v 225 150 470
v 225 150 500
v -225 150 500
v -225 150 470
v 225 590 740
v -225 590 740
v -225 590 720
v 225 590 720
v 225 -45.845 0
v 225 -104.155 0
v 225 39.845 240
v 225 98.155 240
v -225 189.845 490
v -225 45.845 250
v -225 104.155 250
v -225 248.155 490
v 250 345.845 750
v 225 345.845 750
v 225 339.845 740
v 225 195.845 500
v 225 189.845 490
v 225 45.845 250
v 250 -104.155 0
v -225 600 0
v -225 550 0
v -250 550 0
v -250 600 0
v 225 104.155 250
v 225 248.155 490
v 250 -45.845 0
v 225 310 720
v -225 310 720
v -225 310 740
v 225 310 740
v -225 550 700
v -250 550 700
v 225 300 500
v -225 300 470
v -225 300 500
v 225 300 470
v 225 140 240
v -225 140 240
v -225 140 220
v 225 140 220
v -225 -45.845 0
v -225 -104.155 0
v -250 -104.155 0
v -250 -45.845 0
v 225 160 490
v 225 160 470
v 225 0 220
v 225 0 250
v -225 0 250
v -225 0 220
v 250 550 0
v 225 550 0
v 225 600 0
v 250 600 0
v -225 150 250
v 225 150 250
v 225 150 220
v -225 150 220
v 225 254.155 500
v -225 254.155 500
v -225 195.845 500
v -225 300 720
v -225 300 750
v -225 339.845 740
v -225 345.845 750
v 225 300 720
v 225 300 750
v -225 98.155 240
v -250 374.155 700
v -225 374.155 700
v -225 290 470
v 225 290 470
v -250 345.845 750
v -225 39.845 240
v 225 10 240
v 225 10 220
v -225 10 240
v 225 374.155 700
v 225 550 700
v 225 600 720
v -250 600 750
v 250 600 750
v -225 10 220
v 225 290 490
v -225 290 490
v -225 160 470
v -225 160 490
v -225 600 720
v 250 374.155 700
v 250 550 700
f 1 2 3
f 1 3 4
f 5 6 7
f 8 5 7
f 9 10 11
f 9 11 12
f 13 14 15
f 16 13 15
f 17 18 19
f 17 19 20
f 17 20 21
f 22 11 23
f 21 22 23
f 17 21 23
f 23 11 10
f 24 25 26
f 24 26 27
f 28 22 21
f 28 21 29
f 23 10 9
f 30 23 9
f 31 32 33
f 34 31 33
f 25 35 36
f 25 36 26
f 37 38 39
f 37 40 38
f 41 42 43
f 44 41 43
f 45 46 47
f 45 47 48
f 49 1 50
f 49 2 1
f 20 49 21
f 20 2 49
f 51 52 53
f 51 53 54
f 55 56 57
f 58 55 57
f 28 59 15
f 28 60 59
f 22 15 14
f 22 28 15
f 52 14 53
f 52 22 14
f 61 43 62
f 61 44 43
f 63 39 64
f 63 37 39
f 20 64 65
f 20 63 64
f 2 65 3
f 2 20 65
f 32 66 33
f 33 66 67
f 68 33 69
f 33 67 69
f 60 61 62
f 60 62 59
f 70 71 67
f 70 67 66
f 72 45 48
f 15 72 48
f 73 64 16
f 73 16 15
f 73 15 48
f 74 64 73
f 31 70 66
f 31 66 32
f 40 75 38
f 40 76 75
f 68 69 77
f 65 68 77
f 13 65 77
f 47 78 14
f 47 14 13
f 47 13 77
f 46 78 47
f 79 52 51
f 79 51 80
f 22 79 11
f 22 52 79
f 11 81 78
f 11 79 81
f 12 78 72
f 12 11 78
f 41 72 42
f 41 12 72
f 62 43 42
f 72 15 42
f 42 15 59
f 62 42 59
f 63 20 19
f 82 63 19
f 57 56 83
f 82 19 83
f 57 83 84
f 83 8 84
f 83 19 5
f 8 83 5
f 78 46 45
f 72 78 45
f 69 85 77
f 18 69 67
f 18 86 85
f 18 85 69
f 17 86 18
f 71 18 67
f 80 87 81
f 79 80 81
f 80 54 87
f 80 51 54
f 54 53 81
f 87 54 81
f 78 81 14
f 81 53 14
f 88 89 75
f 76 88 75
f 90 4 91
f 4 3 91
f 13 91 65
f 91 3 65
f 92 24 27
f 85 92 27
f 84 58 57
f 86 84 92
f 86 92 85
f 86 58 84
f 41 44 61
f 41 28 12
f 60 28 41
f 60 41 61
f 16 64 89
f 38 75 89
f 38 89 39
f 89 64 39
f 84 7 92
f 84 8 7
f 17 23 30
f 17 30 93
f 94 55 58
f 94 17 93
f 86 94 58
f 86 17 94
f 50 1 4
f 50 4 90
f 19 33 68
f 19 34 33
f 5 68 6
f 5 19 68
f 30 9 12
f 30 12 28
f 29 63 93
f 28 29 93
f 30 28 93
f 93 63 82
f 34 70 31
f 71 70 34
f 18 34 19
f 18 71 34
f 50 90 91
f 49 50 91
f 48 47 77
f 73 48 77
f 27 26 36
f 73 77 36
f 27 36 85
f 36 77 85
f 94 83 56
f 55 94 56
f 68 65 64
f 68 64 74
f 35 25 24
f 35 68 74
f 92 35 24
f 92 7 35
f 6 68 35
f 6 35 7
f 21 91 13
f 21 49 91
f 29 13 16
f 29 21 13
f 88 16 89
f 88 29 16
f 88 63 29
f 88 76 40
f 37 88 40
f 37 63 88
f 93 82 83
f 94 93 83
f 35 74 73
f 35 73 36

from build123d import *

# Parameters (mm, degrees)
F1_DEPTH = 225
F3_DEPTH = 25


with BuildPart() as f1:
    # F0 (on Right) → F1 (new body)
    with BuildSketch(Plane.YZ):
        Polygon((150, 220), (150, 250), (0, 250), (0, 220), (10, 220), (10, 240), (140, 240), (140, 220), align=None)
    extrude(amount=F1_DEPTH)



with BuildPart() as f1b:
    # F0 (on Right) → F1, piece 2 (new body)
    with BuildSketch(Plane.YZ):
        Polygon((160, 470), (160, 490), (290, 490), (290, 470), (300, 470), (300, 500), (150, 500), (150, 470), align=None)
    extrude(amount=F1_DEPTH)


with BuildPart() as f1c:
    # F0 (on Right) → F1, piece 3 (new body)
    with BuildSketch(Plane.YZ):
        Polygon((300, 750), (300, 720), (310, 720), (310, 740), (590, 740), (590, 720), (600, 720), (600, 750), align=None)
    extrude(amount=F1_DEPTH)


with BuildPart() as f1_1:
    add(f1.part)

    add(f1b.part)  # F3 merges F1b

    add(f1c.part)  # F3 merges F1c
    # F2 (on face) → F3 (join)
    with BuildSketch(Plane.YZ.offset(225)):
        Polygon((600, 0), (600, 750), (345.8452405258, 750), (-104.1547594742, 0), (-45.8452405258, 0), (374.1547594742, 700), (550, 700), (550, 0), align=None)
    extrude(amount=F3_DEPTH)

    # F4: F1 across plane


with BuildPart() as f1_2:
    add(f1_1.part)
    add(f1_1.part.mirror(Plane.YZ))


solid = f1_2.part
